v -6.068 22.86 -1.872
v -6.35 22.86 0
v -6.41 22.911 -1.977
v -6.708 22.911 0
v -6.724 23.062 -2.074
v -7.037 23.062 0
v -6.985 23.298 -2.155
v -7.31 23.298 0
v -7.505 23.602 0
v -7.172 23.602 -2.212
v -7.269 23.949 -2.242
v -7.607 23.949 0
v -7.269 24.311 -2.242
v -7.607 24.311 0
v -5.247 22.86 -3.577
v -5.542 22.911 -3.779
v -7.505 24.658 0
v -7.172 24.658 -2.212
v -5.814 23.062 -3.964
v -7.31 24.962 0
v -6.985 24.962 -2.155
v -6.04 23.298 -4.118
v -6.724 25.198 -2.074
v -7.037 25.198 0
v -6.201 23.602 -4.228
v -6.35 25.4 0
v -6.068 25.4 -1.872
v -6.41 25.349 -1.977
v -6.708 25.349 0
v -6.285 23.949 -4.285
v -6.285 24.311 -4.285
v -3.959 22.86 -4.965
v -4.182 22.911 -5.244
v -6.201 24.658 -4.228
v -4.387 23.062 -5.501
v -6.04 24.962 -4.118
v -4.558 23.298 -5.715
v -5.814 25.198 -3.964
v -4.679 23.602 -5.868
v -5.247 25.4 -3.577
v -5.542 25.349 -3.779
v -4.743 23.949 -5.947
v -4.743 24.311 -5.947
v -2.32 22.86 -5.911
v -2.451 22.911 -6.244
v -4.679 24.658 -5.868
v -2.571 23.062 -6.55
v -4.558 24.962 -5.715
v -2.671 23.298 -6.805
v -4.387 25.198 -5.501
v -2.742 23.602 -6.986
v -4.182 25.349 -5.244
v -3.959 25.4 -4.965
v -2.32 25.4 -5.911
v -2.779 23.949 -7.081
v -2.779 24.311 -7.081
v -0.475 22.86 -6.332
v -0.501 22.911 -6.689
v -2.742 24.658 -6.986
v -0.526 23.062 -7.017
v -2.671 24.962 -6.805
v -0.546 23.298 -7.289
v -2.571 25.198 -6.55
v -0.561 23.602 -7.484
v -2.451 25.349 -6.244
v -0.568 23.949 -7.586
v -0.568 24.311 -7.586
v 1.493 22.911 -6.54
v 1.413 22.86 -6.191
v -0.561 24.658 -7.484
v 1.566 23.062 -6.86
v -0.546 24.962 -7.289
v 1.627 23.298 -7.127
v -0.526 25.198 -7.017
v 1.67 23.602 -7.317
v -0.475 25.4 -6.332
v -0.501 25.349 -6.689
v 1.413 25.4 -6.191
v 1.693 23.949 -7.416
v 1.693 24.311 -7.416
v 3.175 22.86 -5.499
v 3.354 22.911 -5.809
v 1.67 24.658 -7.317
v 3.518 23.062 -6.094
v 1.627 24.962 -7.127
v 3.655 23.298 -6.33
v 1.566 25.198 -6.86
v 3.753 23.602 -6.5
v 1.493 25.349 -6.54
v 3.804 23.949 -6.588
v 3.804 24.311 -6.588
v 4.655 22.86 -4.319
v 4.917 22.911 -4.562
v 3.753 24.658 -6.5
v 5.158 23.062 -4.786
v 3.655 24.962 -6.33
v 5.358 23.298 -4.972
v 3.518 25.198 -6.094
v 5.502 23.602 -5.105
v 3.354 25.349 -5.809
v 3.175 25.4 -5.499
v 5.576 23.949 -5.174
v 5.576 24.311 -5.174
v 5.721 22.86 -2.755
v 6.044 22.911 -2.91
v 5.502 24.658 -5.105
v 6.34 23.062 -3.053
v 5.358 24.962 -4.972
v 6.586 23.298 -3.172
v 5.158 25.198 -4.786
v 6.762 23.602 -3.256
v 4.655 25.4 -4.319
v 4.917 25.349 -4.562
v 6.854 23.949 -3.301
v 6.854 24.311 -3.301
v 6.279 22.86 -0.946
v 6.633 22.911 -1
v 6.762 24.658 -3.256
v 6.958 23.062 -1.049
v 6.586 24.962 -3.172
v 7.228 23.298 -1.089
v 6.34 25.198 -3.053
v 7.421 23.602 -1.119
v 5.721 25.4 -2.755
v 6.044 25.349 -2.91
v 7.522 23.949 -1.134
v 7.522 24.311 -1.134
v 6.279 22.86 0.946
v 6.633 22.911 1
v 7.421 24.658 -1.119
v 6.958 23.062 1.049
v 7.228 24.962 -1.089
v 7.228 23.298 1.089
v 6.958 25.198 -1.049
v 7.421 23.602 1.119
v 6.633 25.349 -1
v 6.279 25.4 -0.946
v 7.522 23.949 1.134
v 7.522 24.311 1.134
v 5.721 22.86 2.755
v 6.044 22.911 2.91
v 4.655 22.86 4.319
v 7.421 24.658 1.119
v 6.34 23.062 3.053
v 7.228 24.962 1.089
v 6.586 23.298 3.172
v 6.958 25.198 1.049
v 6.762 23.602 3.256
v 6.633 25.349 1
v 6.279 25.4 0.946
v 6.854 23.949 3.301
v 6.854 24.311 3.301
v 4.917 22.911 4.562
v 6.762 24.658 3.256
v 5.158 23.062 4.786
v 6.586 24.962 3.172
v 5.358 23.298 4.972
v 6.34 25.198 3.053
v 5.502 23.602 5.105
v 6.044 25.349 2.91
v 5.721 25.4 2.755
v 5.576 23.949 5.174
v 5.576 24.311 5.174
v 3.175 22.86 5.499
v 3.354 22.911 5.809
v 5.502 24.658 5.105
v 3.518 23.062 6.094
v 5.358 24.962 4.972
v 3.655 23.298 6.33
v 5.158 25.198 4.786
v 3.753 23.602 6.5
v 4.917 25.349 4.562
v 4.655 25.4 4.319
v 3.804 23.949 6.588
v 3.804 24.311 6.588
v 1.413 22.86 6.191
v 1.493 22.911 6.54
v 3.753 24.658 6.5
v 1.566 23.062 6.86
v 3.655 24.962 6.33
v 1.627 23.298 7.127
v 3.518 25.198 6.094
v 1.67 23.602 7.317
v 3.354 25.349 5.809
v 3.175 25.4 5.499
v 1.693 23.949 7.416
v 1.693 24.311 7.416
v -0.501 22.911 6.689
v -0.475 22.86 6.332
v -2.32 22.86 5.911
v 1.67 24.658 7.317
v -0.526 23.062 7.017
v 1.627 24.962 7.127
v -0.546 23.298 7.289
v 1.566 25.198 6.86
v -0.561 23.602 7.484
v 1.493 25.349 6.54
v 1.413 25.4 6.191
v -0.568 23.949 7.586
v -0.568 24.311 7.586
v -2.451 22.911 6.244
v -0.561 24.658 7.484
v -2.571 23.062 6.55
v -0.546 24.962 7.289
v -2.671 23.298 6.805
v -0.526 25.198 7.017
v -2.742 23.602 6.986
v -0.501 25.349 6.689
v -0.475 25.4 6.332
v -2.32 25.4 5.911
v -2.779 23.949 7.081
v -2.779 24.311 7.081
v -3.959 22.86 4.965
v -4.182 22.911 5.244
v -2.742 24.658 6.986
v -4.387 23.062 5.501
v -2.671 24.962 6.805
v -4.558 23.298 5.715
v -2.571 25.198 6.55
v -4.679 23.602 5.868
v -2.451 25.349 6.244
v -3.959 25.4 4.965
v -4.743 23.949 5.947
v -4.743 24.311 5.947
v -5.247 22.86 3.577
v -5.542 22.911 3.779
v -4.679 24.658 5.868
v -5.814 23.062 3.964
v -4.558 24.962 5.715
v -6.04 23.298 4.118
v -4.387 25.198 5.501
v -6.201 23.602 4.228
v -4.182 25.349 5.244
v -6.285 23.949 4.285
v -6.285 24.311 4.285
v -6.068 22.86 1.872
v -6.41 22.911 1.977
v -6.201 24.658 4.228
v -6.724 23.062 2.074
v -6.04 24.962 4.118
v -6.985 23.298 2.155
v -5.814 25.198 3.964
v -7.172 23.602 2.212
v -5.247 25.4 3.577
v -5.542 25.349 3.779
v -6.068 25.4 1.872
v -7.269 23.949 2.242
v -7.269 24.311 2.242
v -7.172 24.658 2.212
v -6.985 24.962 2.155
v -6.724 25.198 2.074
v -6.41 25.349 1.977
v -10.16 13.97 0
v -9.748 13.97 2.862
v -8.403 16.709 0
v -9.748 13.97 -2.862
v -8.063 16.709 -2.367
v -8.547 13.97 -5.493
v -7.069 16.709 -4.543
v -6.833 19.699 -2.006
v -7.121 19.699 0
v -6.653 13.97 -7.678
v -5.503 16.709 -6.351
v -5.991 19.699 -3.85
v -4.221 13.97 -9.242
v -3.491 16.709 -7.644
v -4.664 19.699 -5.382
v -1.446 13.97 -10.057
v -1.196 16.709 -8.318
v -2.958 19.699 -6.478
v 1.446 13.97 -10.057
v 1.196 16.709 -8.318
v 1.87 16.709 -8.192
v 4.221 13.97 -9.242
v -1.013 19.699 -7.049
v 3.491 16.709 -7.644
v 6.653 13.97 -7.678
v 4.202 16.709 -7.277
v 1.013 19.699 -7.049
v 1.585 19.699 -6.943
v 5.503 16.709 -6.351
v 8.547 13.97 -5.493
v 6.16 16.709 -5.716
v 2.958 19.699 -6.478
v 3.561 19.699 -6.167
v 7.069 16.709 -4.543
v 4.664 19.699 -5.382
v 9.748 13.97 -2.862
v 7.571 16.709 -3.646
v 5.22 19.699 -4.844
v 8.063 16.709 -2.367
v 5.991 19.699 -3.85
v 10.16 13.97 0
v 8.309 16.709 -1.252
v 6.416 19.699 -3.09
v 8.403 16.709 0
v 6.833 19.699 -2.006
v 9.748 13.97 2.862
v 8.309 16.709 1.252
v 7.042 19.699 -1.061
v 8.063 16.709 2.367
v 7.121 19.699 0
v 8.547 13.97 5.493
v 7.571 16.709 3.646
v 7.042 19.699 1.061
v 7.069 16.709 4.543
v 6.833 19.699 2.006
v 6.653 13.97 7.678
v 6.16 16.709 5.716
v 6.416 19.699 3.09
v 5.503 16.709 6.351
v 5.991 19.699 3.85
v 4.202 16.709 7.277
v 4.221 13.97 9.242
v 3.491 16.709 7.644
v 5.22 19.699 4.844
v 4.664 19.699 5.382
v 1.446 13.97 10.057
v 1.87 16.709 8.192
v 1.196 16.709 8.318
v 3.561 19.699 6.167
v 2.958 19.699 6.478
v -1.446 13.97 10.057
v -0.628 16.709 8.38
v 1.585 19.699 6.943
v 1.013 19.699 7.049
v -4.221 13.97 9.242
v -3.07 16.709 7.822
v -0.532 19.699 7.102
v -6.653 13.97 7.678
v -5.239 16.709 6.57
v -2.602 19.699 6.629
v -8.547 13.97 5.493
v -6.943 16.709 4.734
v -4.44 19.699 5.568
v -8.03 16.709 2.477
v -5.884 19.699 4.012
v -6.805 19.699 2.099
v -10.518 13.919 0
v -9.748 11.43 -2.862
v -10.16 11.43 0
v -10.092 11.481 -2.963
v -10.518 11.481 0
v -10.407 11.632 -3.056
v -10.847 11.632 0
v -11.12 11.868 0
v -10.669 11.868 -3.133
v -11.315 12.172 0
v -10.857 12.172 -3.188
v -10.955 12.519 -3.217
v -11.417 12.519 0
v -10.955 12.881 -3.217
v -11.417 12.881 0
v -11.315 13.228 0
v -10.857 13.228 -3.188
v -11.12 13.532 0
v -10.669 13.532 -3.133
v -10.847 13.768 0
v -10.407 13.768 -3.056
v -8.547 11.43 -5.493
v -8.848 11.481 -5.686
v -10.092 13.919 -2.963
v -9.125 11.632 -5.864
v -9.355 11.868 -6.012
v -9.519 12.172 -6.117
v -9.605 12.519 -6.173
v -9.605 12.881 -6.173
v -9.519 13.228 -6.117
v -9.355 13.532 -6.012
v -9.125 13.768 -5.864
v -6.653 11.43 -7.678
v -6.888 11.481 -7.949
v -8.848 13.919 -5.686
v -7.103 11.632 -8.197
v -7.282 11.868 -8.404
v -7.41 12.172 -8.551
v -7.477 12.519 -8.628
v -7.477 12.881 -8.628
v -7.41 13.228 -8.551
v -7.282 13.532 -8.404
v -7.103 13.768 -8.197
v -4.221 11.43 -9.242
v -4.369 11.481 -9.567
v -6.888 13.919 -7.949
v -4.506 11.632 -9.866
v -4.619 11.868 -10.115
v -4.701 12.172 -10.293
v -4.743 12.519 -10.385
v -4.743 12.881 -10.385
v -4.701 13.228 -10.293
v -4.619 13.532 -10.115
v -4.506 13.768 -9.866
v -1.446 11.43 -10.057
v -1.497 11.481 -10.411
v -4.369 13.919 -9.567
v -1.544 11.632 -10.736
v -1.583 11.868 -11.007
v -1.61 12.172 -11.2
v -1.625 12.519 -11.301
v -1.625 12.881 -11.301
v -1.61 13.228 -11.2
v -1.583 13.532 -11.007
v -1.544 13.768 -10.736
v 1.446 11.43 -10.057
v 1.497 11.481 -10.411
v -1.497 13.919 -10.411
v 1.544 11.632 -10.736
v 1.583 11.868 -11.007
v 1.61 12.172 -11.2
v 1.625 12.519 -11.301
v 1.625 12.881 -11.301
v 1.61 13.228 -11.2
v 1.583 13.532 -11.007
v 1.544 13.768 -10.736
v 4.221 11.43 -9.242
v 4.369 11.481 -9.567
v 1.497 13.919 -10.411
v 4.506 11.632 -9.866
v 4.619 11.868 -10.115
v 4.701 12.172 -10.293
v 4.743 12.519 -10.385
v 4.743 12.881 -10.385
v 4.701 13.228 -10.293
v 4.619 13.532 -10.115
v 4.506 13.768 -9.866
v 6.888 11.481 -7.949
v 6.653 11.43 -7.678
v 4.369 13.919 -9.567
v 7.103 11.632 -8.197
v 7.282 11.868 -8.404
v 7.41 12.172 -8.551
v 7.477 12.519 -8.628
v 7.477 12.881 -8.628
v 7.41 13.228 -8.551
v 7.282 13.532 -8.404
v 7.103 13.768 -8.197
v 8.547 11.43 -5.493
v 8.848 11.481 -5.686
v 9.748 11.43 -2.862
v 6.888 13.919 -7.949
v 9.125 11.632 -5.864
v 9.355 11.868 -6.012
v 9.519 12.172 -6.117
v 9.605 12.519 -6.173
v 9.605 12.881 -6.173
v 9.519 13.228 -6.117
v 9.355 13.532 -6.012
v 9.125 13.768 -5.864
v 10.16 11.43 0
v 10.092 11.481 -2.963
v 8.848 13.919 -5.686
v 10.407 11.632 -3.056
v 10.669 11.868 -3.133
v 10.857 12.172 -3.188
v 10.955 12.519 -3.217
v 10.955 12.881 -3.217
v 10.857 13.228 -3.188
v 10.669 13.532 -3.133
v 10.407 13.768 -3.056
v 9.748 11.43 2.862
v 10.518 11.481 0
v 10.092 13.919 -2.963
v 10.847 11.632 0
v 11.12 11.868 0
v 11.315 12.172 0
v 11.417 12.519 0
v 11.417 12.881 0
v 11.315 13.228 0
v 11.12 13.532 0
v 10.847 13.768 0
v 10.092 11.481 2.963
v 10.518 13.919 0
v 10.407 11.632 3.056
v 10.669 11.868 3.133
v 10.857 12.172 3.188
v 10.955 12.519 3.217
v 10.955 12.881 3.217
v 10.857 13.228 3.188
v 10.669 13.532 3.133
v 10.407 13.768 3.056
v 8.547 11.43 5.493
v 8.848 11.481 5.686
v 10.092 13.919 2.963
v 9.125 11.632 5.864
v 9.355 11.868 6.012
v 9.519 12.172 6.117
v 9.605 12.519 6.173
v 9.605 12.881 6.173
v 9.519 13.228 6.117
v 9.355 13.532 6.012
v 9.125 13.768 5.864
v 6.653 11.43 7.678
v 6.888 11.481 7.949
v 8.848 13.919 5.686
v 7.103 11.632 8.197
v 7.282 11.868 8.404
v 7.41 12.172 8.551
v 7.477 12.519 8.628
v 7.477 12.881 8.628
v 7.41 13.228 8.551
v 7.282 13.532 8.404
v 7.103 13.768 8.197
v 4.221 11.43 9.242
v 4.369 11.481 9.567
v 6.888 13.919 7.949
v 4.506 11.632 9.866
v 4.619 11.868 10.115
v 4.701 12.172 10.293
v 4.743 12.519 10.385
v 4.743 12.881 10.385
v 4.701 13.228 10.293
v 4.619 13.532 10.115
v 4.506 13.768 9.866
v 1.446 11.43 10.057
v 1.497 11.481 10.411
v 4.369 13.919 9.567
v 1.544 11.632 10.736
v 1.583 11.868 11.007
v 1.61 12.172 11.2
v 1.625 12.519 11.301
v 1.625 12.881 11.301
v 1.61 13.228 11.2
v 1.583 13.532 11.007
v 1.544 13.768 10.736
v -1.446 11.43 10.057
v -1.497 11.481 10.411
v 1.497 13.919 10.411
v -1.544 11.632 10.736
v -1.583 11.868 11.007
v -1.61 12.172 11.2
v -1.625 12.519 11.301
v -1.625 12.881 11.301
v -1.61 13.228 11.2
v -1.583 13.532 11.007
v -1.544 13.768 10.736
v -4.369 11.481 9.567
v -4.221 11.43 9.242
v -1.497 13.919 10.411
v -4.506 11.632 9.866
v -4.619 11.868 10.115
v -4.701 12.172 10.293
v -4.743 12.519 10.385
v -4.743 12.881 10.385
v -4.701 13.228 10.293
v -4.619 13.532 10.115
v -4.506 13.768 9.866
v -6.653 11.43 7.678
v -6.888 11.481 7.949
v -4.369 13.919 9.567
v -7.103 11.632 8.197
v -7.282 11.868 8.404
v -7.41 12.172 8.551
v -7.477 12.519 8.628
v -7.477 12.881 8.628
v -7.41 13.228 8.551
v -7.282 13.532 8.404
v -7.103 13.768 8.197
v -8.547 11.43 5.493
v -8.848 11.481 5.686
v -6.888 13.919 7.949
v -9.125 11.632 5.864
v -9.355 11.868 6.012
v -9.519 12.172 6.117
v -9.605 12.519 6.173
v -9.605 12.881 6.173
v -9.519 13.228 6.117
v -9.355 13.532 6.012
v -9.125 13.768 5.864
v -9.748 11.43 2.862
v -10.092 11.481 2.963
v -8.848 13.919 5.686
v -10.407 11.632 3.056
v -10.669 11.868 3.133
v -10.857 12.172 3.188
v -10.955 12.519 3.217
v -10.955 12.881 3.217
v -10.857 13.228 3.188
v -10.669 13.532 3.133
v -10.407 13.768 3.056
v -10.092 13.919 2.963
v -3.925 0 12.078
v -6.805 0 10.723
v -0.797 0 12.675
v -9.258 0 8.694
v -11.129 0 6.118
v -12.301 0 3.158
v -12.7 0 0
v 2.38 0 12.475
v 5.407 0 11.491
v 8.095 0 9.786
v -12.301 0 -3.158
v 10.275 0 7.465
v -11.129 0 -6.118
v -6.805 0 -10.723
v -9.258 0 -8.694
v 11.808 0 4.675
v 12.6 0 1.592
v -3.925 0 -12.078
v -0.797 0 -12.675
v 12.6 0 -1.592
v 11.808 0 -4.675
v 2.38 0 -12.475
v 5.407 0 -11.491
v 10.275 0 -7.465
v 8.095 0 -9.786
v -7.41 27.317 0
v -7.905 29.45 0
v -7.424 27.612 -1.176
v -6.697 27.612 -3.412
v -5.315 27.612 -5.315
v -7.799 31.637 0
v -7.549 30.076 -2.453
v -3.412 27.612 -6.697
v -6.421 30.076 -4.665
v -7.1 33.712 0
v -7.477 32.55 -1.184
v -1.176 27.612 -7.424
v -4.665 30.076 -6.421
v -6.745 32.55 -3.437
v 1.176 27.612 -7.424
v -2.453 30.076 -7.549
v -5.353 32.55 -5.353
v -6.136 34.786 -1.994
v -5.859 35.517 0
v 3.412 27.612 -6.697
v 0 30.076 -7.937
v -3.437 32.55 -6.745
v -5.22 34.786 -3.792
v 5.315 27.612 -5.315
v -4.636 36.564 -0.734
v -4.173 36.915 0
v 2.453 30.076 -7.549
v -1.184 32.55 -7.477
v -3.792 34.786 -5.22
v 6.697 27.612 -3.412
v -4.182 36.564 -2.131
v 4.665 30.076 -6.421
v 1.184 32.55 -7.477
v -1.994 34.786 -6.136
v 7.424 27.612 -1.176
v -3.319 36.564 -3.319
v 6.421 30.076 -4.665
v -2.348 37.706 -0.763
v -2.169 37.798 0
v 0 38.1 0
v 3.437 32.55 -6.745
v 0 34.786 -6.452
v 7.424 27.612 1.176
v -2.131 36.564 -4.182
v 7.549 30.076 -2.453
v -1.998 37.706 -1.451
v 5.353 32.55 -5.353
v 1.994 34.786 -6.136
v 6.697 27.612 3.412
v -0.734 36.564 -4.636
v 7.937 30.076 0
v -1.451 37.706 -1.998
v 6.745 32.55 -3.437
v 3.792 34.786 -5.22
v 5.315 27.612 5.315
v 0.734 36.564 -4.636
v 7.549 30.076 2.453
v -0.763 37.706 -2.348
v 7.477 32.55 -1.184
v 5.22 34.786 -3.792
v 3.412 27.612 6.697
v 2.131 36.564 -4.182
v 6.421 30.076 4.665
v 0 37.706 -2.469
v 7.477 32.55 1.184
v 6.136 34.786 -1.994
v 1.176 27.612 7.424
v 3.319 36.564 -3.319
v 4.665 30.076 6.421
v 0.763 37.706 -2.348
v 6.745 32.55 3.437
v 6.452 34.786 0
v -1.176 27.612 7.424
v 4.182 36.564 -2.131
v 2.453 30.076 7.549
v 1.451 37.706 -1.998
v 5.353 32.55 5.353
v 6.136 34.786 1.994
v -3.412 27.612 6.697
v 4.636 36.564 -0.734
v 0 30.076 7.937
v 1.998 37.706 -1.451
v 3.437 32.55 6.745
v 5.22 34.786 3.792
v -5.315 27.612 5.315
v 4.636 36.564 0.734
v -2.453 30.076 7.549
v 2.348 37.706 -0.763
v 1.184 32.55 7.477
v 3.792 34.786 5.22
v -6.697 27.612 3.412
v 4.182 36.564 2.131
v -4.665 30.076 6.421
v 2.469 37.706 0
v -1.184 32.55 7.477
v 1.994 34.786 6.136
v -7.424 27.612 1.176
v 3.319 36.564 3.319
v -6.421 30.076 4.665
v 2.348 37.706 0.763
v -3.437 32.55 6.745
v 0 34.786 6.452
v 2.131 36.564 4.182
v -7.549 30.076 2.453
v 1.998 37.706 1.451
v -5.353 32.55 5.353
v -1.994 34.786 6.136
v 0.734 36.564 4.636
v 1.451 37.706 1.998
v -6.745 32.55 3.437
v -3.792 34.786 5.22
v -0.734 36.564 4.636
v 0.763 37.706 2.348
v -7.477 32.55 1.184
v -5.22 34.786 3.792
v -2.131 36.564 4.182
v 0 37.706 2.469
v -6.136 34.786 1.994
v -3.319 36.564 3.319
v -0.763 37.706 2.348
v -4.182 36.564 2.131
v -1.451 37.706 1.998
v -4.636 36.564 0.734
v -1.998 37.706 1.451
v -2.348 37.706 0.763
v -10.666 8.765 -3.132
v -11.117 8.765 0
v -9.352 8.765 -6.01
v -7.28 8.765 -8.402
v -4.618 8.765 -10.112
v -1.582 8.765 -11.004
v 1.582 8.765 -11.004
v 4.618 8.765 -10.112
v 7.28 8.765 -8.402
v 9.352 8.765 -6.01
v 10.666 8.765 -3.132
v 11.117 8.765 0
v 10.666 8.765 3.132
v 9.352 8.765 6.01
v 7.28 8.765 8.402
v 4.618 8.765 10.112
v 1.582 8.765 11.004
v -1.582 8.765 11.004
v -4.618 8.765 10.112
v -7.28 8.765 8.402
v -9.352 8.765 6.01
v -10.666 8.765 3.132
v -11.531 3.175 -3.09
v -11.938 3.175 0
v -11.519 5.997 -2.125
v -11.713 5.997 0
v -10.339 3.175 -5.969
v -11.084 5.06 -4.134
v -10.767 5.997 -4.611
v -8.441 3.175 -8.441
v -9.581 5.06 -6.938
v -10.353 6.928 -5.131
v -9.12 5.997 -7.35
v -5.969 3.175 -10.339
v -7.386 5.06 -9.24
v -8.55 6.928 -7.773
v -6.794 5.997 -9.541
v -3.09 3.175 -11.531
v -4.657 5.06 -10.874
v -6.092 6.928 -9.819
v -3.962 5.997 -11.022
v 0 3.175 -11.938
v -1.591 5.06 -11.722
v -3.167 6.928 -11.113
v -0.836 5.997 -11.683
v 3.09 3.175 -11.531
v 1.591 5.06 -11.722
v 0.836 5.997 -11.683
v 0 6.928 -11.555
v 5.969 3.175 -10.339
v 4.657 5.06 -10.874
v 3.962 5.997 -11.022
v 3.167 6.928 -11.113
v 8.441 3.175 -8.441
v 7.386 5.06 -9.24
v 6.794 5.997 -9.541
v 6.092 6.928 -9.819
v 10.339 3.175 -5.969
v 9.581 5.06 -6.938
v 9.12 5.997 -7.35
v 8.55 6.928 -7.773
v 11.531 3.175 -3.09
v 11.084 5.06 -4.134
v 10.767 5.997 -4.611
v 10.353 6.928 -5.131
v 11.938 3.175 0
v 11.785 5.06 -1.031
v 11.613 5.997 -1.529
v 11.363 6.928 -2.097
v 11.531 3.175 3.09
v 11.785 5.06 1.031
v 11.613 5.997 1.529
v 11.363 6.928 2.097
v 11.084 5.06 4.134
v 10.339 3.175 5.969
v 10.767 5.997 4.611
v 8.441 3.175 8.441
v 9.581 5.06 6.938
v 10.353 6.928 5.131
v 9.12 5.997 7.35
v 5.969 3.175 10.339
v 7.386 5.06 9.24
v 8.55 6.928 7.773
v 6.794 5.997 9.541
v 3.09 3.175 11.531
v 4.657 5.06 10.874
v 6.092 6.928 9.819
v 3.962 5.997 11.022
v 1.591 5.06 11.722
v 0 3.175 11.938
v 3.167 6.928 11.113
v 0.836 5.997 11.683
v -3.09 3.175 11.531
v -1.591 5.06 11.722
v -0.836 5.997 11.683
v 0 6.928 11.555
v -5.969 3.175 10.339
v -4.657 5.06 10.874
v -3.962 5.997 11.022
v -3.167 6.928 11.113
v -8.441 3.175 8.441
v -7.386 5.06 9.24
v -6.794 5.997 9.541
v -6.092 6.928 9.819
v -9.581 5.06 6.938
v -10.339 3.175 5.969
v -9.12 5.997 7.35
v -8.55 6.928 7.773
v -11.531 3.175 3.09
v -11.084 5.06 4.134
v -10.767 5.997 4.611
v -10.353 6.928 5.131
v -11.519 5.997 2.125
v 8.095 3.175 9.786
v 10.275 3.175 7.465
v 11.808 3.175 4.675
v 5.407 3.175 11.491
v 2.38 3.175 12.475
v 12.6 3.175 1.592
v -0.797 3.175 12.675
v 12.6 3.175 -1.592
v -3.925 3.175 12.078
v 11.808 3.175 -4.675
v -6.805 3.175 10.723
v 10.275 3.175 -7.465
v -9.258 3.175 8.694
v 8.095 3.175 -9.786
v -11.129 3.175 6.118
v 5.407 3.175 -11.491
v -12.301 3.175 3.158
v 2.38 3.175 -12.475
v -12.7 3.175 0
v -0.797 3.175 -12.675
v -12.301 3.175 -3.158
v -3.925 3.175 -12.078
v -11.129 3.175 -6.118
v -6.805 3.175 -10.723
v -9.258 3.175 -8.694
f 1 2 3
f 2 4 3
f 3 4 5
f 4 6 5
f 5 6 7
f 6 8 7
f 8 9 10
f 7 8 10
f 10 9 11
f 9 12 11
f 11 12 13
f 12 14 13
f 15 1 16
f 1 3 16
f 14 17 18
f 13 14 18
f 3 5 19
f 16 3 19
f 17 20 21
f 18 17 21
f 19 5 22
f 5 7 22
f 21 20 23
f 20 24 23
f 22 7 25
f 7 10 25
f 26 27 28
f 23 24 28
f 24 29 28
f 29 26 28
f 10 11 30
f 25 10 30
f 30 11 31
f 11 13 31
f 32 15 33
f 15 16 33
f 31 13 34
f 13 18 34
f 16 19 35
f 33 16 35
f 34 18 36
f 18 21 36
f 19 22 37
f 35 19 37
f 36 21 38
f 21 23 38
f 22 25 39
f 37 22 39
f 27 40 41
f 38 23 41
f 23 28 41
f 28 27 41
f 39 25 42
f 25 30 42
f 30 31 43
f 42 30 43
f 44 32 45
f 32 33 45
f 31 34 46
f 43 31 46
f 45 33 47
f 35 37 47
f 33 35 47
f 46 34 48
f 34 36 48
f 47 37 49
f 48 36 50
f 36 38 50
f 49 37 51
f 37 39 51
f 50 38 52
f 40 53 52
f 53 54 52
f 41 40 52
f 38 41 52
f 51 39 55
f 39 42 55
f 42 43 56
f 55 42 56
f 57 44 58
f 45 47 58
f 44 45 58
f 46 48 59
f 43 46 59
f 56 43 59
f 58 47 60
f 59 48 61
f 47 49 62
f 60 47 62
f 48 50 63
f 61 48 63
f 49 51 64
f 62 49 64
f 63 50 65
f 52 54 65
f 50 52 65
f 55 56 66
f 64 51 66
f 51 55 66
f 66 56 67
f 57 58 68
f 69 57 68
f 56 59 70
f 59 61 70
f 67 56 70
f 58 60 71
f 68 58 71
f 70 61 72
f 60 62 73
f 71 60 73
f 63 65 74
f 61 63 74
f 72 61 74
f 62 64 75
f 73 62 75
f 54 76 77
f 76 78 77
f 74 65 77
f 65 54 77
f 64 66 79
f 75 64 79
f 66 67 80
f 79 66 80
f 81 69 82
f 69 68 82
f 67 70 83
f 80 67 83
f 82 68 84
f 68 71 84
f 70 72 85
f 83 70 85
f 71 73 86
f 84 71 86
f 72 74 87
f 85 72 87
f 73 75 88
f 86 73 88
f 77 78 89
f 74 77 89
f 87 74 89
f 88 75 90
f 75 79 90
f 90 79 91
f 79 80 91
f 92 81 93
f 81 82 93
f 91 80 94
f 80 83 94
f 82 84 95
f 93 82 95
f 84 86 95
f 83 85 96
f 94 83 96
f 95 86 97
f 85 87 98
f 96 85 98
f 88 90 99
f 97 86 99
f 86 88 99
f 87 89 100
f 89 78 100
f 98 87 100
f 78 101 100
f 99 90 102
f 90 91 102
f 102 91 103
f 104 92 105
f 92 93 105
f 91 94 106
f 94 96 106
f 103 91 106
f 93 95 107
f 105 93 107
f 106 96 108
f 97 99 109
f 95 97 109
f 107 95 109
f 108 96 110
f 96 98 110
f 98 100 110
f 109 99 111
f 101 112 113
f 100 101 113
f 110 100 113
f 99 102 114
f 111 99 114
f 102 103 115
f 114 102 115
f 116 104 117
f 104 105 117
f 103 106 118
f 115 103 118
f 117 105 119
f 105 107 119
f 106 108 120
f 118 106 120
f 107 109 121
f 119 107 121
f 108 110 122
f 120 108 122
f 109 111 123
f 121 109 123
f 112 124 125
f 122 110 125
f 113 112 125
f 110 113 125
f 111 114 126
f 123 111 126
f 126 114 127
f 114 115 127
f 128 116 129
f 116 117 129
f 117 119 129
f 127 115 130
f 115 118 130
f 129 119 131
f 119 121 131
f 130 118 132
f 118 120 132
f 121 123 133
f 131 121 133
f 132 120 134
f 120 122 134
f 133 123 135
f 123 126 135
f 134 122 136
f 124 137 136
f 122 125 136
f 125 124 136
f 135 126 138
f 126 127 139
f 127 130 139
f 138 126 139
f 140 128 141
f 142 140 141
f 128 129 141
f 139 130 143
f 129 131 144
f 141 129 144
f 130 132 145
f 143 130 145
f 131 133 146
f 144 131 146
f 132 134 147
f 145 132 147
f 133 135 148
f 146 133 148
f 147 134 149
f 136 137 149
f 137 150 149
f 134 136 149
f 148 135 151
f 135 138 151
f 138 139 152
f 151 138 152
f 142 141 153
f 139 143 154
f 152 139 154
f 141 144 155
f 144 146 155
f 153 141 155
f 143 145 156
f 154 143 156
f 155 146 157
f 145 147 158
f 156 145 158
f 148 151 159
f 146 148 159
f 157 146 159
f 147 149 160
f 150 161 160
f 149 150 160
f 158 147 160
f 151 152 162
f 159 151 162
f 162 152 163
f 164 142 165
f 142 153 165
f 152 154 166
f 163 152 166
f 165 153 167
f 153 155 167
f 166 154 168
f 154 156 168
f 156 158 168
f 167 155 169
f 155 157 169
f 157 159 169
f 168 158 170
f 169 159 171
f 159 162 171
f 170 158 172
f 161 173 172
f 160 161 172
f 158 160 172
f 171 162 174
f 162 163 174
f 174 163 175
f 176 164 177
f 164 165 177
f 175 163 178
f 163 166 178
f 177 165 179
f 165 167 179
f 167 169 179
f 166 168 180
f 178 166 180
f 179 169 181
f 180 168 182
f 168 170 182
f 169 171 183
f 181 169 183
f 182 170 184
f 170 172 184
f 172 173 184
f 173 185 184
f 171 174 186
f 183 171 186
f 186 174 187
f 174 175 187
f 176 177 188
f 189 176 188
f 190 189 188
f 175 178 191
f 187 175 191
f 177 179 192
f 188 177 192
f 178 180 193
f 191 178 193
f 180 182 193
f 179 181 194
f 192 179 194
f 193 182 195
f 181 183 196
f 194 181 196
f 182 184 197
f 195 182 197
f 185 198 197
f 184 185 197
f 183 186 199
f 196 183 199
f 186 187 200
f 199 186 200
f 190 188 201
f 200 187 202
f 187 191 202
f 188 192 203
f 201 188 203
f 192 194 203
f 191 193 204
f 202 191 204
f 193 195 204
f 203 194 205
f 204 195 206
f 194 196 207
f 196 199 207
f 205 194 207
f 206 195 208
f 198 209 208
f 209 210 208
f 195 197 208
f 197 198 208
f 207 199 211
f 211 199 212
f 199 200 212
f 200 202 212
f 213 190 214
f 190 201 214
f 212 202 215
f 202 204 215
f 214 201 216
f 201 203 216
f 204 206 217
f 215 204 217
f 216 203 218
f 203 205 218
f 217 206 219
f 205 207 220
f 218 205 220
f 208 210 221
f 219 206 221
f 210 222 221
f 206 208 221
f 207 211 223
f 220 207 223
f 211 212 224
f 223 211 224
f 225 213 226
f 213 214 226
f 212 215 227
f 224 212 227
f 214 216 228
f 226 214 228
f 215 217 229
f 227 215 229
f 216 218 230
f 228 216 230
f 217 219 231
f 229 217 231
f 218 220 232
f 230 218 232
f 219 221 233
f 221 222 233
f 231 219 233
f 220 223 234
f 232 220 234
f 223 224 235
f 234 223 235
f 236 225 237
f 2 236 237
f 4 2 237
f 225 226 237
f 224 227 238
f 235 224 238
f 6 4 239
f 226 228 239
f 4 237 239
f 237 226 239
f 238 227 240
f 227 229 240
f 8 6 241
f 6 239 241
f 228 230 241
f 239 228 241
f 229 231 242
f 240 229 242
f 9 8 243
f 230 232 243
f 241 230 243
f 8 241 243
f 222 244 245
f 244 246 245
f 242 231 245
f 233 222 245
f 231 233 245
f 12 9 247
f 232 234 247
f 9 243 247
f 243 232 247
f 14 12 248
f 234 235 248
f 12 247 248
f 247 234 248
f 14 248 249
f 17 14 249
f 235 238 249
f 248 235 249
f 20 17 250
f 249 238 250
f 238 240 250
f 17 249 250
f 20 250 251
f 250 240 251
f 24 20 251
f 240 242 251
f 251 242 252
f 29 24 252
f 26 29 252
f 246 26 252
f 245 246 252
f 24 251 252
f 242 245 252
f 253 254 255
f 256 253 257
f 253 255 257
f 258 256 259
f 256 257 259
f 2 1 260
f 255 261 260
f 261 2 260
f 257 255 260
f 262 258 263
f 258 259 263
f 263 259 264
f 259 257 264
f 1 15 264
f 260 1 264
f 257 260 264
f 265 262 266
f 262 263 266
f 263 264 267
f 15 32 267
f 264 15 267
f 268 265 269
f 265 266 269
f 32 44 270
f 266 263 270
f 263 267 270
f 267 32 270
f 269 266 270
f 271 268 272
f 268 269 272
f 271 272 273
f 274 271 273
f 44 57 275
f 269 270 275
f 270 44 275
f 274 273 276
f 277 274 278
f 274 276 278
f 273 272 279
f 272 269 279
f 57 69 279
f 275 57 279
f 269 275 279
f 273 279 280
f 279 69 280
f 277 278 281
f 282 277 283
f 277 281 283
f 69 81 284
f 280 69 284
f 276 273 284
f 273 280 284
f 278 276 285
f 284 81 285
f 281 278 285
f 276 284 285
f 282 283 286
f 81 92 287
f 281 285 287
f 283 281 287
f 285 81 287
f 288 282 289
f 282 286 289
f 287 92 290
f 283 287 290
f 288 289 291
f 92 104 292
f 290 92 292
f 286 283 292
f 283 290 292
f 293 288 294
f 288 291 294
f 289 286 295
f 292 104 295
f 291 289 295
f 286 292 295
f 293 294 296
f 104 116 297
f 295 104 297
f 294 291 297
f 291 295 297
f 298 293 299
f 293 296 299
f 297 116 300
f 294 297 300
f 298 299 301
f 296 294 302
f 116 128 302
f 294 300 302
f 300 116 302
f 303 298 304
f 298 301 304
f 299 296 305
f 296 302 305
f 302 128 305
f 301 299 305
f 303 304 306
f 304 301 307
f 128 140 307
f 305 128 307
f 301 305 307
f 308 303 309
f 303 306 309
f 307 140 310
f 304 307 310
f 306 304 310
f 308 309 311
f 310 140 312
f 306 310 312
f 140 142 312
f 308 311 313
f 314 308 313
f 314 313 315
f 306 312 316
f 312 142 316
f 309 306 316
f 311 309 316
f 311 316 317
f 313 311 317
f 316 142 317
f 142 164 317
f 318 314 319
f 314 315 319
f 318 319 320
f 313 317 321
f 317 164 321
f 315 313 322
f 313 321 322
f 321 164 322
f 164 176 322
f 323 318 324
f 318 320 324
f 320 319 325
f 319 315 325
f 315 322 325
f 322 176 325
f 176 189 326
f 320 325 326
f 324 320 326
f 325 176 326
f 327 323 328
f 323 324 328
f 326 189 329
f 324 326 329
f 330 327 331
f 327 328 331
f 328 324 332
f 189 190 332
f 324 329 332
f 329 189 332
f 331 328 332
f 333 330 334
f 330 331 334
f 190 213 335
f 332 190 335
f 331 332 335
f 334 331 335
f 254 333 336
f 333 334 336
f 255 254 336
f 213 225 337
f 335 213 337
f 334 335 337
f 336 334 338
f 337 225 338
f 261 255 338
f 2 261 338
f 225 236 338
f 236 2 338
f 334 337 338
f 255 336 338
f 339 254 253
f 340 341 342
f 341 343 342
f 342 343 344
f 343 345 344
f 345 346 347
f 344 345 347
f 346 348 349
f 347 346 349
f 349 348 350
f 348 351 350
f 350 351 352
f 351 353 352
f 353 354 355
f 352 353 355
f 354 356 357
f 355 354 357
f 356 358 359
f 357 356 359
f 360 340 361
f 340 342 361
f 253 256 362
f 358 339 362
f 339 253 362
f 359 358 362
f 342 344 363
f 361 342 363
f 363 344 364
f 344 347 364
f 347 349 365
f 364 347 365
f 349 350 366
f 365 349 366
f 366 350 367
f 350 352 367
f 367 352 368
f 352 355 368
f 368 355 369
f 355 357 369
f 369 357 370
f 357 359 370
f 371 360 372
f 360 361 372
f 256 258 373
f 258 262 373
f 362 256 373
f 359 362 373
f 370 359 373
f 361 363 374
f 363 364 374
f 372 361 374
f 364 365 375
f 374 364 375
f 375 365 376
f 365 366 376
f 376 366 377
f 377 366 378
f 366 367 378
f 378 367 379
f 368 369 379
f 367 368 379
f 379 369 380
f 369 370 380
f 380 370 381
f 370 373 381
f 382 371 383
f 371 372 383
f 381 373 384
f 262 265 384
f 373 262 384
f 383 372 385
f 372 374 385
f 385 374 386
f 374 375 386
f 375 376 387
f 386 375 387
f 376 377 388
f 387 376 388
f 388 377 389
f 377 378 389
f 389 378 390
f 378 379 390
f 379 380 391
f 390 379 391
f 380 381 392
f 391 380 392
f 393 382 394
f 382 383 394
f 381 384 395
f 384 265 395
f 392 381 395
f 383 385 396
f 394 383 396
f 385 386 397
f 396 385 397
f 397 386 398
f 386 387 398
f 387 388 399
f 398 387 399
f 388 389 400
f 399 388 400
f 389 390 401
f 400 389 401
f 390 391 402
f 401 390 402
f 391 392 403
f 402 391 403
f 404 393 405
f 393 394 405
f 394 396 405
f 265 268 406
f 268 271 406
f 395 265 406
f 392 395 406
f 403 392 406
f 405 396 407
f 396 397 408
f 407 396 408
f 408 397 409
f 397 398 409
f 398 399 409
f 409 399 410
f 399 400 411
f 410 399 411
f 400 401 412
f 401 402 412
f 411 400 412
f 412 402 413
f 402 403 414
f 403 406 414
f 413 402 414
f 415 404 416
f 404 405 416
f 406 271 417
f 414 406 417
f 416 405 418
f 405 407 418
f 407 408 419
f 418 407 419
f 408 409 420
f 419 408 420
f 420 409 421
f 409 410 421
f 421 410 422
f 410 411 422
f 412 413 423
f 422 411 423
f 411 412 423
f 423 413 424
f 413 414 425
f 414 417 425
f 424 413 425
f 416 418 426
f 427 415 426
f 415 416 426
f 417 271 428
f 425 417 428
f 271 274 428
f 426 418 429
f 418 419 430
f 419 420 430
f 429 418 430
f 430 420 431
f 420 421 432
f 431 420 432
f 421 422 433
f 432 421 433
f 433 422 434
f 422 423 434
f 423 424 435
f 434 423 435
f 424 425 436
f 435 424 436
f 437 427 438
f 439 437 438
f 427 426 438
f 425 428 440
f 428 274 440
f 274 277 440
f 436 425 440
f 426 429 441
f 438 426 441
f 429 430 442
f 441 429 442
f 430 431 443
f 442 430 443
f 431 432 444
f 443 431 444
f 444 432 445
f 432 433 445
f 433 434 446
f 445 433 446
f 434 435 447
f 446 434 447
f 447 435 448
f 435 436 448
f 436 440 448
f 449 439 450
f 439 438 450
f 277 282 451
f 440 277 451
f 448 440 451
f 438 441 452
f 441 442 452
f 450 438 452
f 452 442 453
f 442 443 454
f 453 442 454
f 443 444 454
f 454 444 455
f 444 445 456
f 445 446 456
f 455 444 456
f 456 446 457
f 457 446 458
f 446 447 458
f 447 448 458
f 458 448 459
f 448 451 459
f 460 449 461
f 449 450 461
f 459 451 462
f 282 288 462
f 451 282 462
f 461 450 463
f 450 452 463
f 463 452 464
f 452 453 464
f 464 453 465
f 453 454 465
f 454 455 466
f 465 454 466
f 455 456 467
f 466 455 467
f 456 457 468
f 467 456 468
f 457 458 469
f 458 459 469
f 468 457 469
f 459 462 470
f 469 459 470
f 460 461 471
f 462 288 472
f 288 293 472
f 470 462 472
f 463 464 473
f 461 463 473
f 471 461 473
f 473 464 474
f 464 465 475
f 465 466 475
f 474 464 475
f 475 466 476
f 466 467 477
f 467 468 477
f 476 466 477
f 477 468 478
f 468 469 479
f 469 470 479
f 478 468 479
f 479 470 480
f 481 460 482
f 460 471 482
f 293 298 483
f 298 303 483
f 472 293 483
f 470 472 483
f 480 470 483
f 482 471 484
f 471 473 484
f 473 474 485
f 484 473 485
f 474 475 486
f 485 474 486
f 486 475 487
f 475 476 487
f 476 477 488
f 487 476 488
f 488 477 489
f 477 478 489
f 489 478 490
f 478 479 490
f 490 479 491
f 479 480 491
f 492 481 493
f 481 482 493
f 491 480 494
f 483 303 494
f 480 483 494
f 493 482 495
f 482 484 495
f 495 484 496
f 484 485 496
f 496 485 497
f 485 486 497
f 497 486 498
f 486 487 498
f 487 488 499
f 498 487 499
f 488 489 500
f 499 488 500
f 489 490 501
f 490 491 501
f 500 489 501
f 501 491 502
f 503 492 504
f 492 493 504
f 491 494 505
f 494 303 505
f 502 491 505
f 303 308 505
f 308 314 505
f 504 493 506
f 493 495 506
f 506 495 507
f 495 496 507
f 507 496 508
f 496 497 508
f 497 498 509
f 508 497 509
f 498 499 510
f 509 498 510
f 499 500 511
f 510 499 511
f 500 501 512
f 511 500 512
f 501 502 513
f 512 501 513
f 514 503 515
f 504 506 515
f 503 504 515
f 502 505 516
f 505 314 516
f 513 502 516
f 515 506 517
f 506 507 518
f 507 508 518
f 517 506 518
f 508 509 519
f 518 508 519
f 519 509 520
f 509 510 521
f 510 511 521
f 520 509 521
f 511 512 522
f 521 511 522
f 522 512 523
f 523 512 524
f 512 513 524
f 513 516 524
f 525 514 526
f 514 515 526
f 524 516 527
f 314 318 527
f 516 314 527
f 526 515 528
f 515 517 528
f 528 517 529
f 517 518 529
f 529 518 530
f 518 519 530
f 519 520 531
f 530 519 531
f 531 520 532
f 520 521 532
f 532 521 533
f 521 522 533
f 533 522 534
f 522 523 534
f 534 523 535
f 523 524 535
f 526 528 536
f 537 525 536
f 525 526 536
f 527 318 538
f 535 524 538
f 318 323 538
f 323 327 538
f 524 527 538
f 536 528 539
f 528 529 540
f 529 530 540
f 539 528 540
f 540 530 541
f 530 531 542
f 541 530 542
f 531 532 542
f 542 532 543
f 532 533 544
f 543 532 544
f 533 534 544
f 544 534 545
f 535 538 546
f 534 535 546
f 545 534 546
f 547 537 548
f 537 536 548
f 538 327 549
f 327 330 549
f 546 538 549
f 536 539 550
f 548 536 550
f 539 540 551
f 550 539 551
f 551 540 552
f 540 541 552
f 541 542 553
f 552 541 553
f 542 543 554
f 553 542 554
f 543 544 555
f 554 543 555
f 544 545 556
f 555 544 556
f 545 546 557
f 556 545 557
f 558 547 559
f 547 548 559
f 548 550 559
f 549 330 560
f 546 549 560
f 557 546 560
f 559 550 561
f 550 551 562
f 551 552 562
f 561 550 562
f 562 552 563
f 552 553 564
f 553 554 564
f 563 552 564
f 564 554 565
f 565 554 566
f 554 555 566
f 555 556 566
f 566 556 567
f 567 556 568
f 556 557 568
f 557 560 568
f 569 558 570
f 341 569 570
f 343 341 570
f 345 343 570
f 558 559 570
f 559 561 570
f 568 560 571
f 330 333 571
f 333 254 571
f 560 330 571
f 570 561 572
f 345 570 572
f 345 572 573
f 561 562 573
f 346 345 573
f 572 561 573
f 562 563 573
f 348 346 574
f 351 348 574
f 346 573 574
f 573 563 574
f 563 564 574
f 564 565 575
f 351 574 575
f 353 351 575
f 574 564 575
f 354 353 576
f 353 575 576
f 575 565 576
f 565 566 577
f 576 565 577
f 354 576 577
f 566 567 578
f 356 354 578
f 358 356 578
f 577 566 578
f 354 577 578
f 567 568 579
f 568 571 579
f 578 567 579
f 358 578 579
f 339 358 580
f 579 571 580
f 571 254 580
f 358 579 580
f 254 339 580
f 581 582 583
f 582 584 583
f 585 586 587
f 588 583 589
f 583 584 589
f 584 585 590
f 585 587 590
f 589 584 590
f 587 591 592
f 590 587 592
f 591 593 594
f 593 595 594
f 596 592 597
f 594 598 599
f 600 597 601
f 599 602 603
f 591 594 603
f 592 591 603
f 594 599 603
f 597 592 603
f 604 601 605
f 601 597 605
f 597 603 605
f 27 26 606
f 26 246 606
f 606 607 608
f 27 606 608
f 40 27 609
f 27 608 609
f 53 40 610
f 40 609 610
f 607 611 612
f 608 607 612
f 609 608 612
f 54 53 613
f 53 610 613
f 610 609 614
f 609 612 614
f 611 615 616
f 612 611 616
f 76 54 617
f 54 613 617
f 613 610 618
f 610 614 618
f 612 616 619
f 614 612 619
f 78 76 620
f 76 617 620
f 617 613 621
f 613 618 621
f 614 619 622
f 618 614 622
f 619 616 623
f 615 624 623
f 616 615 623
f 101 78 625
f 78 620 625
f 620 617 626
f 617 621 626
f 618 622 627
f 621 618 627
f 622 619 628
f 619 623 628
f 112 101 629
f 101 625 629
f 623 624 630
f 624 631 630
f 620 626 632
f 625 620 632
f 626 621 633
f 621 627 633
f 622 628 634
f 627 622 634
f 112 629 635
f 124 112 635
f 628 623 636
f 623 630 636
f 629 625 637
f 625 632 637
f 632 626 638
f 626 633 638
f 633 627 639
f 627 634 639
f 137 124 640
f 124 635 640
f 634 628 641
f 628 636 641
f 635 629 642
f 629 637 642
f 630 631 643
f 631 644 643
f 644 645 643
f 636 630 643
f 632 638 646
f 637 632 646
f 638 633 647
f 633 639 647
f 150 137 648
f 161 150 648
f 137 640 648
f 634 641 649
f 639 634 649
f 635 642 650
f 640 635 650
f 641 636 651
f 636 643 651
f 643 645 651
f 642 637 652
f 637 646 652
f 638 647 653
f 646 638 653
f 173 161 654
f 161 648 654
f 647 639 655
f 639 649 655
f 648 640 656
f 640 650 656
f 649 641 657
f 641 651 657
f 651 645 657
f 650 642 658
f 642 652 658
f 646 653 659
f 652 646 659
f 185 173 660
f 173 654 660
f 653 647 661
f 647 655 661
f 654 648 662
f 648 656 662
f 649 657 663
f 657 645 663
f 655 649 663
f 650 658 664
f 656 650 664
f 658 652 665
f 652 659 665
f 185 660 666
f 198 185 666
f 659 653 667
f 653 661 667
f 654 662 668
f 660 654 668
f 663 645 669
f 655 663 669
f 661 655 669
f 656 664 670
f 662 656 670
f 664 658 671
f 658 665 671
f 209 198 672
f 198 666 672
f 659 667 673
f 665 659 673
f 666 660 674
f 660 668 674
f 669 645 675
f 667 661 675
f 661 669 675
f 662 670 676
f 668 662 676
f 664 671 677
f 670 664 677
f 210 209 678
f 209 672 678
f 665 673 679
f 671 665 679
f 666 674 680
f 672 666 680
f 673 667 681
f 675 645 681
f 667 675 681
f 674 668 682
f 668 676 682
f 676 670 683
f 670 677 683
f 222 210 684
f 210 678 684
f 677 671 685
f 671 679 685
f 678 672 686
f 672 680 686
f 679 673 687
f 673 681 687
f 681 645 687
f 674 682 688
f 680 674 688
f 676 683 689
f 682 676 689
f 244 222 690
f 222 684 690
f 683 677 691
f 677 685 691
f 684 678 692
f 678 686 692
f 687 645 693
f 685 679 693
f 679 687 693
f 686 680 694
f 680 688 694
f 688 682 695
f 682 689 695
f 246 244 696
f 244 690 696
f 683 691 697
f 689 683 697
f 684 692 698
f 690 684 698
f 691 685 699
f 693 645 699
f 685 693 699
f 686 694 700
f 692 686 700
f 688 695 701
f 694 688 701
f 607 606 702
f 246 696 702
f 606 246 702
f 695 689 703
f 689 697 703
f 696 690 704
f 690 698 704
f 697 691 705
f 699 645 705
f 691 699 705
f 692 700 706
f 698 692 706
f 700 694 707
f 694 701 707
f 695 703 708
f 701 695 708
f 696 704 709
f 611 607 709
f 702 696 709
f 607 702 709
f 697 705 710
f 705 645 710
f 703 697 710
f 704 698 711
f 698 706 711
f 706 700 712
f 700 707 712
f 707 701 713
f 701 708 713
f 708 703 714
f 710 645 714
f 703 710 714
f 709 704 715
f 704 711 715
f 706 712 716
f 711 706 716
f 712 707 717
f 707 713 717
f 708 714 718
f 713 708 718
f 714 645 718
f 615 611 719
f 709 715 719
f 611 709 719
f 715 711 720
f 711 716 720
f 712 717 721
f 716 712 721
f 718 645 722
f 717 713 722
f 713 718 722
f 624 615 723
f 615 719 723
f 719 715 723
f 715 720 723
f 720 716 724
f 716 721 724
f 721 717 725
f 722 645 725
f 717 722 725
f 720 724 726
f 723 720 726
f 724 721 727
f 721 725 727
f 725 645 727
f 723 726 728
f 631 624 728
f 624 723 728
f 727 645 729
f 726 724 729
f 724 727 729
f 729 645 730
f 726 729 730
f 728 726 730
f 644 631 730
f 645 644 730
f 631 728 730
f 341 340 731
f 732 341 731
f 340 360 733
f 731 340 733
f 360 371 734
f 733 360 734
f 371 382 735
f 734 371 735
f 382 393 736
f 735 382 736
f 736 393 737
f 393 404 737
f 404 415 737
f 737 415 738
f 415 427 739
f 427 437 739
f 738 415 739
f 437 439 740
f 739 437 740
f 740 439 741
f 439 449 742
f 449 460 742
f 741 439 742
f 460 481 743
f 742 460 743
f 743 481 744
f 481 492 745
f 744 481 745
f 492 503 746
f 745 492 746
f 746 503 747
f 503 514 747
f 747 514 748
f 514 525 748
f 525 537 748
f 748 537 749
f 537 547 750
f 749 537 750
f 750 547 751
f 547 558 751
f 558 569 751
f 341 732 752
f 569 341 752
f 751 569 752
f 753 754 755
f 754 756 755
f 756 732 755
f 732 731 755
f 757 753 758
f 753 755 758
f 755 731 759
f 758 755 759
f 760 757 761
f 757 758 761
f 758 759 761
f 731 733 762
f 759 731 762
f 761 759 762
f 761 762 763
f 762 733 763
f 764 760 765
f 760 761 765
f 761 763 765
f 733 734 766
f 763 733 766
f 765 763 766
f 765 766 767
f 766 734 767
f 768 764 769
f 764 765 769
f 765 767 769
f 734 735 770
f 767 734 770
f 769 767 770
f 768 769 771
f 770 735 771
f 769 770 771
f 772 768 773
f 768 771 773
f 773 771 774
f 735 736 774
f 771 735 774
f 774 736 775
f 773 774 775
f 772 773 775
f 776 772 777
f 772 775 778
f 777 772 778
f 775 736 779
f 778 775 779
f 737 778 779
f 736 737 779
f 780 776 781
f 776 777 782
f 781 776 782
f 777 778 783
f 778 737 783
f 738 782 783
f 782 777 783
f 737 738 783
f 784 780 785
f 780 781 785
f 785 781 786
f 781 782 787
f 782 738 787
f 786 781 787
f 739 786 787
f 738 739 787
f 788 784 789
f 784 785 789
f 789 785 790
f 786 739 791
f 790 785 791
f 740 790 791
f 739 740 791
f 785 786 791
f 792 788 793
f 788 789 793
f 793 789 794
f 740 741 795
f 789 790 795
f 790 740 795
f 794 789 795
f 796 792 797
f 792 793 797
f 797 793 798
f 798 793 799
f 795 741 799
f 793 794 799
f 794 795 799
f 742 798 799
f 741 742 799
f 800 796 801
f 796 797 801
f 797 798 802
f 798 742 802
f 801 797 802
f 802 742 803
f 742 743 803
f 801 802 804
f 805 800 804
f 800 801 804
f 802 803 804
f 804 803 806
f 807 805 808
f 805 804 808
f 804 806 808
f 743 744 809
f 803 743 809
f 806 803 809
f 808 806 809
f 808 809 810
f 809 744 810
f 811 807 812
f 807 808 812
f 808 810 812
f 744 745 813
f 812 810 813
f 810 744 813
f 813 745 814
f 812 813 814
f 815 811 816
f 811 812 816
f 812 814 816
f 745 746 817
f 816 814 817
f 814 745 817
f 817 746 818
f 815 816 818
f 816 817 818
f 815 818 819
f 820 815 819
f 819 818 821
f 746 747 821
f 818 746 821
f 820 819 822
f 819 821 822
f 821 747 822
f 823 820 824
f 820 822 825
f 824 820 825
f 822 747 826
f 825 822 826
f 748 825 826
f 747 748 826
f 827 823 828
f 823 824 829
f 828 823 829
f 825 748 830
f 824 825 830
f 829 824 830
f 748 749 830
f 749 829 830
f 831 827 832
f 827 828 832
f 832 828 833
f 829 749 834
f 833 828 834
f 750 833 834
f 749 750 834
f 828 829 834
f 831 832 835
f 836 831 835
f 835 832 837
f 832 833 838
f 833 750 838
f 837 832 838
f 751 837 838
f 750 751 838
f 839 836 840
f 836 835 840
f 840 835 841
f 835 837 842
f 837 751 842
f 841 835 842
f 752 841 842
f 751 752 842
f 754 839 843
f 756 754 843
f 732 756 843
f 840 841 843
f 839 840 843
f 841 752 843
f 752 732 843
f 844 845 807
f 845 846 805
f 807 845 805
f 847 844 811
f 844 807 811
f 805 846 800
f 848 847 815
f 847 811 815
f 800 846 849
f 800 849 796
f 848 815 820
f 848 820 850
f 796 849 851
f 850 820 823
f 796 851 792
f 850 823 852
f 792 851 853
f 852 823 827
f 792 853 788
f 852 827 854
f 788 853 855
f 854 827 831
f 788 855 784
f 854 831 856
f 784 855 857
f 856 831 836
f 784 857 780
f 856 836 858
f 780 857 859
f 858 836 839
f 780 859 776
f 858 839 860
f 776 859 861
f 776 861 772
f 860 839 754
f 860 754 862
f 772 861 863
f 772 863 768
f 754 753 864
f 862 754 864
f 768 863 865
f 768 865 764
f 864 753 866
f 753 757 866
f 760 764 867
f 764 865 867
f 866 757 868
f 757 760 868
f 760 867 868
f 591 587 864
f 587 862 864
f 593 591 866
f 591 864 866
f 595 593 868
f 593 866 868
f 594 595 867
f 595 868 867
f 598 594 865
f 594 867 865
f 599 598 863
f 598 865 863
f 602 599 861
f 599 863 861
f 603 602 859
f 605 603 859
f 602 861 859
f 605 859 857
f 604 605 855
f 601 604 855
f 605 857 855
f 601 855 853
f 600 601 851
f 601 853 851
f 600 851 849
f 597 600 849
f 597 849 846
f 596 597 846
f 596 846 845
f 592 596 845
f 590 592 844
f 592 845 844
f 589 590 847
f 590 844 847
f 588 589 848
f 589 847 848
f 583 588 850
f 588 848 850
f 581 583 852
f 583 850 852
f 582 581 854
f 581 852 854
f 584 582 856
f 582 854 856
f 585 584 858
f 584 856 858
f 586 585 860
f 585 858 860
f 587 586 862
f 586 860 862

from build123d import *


with BuildPart() as part:
    # Sketch1 → Revolve1 (revolve)
    with BuildSketch(Plane.XY, mode=Mode.PRIVATE) as revolve1_sk:
        with BuildLine():
            Line((0, 0), (12.7, 0))
            Line((12.7, 0), (12.7, 3.175))
            Line((12.7, 3.175), (11.938, 3.175))
            ThreePointArc((11.938, 3.175), (11.460765371, 7.391187926), (10.16, 11.43))
            ThreePointArc((10.16, 11.43), (11.43, 12.7), (10.16, 13.97))
            ThreePointArc((10.16, 13.97), (7.700355765, 18.177295328), (6.35, 22.86))
            ThreePointArc((6.35, 22.86), (7.62, 24.13), (6.35, 25.4))
            ThreePointArc((6.35, 25.4), (7.099515829, 33.712257914), (0, 38.1))
            Line((0, 38.1), (0, 0))
        make_face()
    revolve(revolve1_sk.sketch.rotate(Axis((0, 38.1, 0), (0, -1, 0)), 180), axis=Axis((0, 38.1, 0), (0, -1, 0)))


solid = part.part
